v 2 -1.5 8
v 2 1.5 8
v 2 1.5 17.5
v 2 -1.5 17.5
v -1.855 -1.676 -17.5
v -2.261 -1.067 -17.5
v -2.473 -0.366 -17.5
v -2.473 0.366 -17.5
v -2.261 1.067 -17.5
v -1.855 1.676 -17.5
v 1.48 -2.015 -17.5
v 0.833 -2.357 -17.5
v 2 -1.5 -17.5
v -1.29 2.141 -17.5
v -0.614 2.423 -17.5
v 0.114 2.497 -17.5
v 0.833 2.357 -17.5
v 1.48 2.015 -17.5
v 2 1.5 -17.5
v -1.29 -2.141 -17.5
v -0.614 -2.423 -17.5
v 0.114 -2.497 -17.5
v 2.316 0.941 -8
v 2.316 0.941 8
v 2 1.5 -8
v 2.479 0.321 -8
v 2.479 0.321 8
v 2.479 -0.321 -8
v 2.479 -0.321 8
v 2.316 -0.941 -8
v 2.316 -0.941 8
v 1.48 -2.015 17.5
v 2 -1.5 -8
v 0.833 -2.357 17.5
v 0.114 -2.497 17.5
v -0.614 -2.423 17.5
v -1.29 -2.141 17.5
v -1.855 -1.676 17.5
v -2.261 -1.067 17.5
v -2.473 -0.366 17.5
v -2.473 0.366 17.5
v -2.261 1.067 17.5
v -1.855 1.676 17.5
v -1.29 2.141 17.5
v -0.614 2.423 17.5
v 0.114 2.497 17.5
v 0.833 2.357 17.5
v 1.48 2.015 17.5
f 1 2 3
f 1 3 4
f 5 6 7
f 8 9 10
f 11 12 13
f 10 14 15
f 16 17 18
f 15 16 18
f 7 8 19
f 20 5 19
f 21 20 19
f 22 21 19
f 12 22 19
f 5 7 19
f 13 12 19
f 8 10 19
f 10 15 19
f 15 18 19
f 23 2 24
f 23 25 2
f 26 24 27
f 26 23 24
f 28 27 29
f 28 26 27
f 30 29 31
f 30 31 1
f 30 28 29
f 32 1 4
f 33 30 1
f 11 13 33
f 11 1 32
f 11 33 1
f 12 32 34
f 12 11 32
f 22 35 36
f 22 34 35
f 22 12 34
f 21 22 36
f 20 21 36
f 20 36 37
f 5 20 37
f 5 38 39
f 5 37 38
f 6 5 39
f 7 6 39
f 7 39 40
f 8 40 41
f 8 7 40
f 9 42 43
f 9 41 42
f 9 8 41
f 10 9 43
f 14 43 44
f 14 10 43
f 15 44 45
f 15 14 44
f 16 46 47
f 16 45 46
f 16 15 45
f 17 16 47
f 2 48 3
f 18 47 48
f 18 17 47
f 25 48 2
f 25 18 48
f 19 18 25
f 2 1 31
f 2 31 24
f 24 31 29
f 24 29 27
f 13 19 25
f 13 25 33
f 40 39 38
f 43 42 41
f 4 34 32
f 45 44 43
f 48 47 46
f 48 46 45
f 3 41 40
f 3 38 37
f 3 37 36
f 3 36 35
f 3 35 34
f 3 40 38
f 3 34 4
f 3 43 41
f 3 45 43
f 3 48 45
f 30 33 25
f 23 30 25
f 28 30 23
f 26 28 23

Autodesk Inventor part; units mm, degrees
ref_plane "YZ Plane" through (0, 0, 0) normal (1, 0, 0) x (0, 1, 0)
ref_plane "XZ Plane" through (0, 0, 0) normal (0, 1, 0) x (-1, 0, 0)
ref_plane "XY Plane" through (0, 0, 0) normal (0, 0, 1) x (1, 0, 0)
sketch "Sketch1" plane through (0, 0, 0) normal (0, 0, 1) x (1, 0, 0)
  circle A0 centre (0, 0) radius 2.5
  line L0 (2, 1.5) -> (2, -1.5)
  dimension "d0" = 5
  dimension "d1" = 2
extrude "Extrusion1" add sketch "Sketch1" along normal mid plane 35 contours L0 A0 picked at (0.2258, 0.7583)
extrude "Extrusion2" add sketch "Sketch1" along normal mid plane 16 contours A0 L0 picked at (2.0912, -0.3466)
properties part number "CrankShaft"
